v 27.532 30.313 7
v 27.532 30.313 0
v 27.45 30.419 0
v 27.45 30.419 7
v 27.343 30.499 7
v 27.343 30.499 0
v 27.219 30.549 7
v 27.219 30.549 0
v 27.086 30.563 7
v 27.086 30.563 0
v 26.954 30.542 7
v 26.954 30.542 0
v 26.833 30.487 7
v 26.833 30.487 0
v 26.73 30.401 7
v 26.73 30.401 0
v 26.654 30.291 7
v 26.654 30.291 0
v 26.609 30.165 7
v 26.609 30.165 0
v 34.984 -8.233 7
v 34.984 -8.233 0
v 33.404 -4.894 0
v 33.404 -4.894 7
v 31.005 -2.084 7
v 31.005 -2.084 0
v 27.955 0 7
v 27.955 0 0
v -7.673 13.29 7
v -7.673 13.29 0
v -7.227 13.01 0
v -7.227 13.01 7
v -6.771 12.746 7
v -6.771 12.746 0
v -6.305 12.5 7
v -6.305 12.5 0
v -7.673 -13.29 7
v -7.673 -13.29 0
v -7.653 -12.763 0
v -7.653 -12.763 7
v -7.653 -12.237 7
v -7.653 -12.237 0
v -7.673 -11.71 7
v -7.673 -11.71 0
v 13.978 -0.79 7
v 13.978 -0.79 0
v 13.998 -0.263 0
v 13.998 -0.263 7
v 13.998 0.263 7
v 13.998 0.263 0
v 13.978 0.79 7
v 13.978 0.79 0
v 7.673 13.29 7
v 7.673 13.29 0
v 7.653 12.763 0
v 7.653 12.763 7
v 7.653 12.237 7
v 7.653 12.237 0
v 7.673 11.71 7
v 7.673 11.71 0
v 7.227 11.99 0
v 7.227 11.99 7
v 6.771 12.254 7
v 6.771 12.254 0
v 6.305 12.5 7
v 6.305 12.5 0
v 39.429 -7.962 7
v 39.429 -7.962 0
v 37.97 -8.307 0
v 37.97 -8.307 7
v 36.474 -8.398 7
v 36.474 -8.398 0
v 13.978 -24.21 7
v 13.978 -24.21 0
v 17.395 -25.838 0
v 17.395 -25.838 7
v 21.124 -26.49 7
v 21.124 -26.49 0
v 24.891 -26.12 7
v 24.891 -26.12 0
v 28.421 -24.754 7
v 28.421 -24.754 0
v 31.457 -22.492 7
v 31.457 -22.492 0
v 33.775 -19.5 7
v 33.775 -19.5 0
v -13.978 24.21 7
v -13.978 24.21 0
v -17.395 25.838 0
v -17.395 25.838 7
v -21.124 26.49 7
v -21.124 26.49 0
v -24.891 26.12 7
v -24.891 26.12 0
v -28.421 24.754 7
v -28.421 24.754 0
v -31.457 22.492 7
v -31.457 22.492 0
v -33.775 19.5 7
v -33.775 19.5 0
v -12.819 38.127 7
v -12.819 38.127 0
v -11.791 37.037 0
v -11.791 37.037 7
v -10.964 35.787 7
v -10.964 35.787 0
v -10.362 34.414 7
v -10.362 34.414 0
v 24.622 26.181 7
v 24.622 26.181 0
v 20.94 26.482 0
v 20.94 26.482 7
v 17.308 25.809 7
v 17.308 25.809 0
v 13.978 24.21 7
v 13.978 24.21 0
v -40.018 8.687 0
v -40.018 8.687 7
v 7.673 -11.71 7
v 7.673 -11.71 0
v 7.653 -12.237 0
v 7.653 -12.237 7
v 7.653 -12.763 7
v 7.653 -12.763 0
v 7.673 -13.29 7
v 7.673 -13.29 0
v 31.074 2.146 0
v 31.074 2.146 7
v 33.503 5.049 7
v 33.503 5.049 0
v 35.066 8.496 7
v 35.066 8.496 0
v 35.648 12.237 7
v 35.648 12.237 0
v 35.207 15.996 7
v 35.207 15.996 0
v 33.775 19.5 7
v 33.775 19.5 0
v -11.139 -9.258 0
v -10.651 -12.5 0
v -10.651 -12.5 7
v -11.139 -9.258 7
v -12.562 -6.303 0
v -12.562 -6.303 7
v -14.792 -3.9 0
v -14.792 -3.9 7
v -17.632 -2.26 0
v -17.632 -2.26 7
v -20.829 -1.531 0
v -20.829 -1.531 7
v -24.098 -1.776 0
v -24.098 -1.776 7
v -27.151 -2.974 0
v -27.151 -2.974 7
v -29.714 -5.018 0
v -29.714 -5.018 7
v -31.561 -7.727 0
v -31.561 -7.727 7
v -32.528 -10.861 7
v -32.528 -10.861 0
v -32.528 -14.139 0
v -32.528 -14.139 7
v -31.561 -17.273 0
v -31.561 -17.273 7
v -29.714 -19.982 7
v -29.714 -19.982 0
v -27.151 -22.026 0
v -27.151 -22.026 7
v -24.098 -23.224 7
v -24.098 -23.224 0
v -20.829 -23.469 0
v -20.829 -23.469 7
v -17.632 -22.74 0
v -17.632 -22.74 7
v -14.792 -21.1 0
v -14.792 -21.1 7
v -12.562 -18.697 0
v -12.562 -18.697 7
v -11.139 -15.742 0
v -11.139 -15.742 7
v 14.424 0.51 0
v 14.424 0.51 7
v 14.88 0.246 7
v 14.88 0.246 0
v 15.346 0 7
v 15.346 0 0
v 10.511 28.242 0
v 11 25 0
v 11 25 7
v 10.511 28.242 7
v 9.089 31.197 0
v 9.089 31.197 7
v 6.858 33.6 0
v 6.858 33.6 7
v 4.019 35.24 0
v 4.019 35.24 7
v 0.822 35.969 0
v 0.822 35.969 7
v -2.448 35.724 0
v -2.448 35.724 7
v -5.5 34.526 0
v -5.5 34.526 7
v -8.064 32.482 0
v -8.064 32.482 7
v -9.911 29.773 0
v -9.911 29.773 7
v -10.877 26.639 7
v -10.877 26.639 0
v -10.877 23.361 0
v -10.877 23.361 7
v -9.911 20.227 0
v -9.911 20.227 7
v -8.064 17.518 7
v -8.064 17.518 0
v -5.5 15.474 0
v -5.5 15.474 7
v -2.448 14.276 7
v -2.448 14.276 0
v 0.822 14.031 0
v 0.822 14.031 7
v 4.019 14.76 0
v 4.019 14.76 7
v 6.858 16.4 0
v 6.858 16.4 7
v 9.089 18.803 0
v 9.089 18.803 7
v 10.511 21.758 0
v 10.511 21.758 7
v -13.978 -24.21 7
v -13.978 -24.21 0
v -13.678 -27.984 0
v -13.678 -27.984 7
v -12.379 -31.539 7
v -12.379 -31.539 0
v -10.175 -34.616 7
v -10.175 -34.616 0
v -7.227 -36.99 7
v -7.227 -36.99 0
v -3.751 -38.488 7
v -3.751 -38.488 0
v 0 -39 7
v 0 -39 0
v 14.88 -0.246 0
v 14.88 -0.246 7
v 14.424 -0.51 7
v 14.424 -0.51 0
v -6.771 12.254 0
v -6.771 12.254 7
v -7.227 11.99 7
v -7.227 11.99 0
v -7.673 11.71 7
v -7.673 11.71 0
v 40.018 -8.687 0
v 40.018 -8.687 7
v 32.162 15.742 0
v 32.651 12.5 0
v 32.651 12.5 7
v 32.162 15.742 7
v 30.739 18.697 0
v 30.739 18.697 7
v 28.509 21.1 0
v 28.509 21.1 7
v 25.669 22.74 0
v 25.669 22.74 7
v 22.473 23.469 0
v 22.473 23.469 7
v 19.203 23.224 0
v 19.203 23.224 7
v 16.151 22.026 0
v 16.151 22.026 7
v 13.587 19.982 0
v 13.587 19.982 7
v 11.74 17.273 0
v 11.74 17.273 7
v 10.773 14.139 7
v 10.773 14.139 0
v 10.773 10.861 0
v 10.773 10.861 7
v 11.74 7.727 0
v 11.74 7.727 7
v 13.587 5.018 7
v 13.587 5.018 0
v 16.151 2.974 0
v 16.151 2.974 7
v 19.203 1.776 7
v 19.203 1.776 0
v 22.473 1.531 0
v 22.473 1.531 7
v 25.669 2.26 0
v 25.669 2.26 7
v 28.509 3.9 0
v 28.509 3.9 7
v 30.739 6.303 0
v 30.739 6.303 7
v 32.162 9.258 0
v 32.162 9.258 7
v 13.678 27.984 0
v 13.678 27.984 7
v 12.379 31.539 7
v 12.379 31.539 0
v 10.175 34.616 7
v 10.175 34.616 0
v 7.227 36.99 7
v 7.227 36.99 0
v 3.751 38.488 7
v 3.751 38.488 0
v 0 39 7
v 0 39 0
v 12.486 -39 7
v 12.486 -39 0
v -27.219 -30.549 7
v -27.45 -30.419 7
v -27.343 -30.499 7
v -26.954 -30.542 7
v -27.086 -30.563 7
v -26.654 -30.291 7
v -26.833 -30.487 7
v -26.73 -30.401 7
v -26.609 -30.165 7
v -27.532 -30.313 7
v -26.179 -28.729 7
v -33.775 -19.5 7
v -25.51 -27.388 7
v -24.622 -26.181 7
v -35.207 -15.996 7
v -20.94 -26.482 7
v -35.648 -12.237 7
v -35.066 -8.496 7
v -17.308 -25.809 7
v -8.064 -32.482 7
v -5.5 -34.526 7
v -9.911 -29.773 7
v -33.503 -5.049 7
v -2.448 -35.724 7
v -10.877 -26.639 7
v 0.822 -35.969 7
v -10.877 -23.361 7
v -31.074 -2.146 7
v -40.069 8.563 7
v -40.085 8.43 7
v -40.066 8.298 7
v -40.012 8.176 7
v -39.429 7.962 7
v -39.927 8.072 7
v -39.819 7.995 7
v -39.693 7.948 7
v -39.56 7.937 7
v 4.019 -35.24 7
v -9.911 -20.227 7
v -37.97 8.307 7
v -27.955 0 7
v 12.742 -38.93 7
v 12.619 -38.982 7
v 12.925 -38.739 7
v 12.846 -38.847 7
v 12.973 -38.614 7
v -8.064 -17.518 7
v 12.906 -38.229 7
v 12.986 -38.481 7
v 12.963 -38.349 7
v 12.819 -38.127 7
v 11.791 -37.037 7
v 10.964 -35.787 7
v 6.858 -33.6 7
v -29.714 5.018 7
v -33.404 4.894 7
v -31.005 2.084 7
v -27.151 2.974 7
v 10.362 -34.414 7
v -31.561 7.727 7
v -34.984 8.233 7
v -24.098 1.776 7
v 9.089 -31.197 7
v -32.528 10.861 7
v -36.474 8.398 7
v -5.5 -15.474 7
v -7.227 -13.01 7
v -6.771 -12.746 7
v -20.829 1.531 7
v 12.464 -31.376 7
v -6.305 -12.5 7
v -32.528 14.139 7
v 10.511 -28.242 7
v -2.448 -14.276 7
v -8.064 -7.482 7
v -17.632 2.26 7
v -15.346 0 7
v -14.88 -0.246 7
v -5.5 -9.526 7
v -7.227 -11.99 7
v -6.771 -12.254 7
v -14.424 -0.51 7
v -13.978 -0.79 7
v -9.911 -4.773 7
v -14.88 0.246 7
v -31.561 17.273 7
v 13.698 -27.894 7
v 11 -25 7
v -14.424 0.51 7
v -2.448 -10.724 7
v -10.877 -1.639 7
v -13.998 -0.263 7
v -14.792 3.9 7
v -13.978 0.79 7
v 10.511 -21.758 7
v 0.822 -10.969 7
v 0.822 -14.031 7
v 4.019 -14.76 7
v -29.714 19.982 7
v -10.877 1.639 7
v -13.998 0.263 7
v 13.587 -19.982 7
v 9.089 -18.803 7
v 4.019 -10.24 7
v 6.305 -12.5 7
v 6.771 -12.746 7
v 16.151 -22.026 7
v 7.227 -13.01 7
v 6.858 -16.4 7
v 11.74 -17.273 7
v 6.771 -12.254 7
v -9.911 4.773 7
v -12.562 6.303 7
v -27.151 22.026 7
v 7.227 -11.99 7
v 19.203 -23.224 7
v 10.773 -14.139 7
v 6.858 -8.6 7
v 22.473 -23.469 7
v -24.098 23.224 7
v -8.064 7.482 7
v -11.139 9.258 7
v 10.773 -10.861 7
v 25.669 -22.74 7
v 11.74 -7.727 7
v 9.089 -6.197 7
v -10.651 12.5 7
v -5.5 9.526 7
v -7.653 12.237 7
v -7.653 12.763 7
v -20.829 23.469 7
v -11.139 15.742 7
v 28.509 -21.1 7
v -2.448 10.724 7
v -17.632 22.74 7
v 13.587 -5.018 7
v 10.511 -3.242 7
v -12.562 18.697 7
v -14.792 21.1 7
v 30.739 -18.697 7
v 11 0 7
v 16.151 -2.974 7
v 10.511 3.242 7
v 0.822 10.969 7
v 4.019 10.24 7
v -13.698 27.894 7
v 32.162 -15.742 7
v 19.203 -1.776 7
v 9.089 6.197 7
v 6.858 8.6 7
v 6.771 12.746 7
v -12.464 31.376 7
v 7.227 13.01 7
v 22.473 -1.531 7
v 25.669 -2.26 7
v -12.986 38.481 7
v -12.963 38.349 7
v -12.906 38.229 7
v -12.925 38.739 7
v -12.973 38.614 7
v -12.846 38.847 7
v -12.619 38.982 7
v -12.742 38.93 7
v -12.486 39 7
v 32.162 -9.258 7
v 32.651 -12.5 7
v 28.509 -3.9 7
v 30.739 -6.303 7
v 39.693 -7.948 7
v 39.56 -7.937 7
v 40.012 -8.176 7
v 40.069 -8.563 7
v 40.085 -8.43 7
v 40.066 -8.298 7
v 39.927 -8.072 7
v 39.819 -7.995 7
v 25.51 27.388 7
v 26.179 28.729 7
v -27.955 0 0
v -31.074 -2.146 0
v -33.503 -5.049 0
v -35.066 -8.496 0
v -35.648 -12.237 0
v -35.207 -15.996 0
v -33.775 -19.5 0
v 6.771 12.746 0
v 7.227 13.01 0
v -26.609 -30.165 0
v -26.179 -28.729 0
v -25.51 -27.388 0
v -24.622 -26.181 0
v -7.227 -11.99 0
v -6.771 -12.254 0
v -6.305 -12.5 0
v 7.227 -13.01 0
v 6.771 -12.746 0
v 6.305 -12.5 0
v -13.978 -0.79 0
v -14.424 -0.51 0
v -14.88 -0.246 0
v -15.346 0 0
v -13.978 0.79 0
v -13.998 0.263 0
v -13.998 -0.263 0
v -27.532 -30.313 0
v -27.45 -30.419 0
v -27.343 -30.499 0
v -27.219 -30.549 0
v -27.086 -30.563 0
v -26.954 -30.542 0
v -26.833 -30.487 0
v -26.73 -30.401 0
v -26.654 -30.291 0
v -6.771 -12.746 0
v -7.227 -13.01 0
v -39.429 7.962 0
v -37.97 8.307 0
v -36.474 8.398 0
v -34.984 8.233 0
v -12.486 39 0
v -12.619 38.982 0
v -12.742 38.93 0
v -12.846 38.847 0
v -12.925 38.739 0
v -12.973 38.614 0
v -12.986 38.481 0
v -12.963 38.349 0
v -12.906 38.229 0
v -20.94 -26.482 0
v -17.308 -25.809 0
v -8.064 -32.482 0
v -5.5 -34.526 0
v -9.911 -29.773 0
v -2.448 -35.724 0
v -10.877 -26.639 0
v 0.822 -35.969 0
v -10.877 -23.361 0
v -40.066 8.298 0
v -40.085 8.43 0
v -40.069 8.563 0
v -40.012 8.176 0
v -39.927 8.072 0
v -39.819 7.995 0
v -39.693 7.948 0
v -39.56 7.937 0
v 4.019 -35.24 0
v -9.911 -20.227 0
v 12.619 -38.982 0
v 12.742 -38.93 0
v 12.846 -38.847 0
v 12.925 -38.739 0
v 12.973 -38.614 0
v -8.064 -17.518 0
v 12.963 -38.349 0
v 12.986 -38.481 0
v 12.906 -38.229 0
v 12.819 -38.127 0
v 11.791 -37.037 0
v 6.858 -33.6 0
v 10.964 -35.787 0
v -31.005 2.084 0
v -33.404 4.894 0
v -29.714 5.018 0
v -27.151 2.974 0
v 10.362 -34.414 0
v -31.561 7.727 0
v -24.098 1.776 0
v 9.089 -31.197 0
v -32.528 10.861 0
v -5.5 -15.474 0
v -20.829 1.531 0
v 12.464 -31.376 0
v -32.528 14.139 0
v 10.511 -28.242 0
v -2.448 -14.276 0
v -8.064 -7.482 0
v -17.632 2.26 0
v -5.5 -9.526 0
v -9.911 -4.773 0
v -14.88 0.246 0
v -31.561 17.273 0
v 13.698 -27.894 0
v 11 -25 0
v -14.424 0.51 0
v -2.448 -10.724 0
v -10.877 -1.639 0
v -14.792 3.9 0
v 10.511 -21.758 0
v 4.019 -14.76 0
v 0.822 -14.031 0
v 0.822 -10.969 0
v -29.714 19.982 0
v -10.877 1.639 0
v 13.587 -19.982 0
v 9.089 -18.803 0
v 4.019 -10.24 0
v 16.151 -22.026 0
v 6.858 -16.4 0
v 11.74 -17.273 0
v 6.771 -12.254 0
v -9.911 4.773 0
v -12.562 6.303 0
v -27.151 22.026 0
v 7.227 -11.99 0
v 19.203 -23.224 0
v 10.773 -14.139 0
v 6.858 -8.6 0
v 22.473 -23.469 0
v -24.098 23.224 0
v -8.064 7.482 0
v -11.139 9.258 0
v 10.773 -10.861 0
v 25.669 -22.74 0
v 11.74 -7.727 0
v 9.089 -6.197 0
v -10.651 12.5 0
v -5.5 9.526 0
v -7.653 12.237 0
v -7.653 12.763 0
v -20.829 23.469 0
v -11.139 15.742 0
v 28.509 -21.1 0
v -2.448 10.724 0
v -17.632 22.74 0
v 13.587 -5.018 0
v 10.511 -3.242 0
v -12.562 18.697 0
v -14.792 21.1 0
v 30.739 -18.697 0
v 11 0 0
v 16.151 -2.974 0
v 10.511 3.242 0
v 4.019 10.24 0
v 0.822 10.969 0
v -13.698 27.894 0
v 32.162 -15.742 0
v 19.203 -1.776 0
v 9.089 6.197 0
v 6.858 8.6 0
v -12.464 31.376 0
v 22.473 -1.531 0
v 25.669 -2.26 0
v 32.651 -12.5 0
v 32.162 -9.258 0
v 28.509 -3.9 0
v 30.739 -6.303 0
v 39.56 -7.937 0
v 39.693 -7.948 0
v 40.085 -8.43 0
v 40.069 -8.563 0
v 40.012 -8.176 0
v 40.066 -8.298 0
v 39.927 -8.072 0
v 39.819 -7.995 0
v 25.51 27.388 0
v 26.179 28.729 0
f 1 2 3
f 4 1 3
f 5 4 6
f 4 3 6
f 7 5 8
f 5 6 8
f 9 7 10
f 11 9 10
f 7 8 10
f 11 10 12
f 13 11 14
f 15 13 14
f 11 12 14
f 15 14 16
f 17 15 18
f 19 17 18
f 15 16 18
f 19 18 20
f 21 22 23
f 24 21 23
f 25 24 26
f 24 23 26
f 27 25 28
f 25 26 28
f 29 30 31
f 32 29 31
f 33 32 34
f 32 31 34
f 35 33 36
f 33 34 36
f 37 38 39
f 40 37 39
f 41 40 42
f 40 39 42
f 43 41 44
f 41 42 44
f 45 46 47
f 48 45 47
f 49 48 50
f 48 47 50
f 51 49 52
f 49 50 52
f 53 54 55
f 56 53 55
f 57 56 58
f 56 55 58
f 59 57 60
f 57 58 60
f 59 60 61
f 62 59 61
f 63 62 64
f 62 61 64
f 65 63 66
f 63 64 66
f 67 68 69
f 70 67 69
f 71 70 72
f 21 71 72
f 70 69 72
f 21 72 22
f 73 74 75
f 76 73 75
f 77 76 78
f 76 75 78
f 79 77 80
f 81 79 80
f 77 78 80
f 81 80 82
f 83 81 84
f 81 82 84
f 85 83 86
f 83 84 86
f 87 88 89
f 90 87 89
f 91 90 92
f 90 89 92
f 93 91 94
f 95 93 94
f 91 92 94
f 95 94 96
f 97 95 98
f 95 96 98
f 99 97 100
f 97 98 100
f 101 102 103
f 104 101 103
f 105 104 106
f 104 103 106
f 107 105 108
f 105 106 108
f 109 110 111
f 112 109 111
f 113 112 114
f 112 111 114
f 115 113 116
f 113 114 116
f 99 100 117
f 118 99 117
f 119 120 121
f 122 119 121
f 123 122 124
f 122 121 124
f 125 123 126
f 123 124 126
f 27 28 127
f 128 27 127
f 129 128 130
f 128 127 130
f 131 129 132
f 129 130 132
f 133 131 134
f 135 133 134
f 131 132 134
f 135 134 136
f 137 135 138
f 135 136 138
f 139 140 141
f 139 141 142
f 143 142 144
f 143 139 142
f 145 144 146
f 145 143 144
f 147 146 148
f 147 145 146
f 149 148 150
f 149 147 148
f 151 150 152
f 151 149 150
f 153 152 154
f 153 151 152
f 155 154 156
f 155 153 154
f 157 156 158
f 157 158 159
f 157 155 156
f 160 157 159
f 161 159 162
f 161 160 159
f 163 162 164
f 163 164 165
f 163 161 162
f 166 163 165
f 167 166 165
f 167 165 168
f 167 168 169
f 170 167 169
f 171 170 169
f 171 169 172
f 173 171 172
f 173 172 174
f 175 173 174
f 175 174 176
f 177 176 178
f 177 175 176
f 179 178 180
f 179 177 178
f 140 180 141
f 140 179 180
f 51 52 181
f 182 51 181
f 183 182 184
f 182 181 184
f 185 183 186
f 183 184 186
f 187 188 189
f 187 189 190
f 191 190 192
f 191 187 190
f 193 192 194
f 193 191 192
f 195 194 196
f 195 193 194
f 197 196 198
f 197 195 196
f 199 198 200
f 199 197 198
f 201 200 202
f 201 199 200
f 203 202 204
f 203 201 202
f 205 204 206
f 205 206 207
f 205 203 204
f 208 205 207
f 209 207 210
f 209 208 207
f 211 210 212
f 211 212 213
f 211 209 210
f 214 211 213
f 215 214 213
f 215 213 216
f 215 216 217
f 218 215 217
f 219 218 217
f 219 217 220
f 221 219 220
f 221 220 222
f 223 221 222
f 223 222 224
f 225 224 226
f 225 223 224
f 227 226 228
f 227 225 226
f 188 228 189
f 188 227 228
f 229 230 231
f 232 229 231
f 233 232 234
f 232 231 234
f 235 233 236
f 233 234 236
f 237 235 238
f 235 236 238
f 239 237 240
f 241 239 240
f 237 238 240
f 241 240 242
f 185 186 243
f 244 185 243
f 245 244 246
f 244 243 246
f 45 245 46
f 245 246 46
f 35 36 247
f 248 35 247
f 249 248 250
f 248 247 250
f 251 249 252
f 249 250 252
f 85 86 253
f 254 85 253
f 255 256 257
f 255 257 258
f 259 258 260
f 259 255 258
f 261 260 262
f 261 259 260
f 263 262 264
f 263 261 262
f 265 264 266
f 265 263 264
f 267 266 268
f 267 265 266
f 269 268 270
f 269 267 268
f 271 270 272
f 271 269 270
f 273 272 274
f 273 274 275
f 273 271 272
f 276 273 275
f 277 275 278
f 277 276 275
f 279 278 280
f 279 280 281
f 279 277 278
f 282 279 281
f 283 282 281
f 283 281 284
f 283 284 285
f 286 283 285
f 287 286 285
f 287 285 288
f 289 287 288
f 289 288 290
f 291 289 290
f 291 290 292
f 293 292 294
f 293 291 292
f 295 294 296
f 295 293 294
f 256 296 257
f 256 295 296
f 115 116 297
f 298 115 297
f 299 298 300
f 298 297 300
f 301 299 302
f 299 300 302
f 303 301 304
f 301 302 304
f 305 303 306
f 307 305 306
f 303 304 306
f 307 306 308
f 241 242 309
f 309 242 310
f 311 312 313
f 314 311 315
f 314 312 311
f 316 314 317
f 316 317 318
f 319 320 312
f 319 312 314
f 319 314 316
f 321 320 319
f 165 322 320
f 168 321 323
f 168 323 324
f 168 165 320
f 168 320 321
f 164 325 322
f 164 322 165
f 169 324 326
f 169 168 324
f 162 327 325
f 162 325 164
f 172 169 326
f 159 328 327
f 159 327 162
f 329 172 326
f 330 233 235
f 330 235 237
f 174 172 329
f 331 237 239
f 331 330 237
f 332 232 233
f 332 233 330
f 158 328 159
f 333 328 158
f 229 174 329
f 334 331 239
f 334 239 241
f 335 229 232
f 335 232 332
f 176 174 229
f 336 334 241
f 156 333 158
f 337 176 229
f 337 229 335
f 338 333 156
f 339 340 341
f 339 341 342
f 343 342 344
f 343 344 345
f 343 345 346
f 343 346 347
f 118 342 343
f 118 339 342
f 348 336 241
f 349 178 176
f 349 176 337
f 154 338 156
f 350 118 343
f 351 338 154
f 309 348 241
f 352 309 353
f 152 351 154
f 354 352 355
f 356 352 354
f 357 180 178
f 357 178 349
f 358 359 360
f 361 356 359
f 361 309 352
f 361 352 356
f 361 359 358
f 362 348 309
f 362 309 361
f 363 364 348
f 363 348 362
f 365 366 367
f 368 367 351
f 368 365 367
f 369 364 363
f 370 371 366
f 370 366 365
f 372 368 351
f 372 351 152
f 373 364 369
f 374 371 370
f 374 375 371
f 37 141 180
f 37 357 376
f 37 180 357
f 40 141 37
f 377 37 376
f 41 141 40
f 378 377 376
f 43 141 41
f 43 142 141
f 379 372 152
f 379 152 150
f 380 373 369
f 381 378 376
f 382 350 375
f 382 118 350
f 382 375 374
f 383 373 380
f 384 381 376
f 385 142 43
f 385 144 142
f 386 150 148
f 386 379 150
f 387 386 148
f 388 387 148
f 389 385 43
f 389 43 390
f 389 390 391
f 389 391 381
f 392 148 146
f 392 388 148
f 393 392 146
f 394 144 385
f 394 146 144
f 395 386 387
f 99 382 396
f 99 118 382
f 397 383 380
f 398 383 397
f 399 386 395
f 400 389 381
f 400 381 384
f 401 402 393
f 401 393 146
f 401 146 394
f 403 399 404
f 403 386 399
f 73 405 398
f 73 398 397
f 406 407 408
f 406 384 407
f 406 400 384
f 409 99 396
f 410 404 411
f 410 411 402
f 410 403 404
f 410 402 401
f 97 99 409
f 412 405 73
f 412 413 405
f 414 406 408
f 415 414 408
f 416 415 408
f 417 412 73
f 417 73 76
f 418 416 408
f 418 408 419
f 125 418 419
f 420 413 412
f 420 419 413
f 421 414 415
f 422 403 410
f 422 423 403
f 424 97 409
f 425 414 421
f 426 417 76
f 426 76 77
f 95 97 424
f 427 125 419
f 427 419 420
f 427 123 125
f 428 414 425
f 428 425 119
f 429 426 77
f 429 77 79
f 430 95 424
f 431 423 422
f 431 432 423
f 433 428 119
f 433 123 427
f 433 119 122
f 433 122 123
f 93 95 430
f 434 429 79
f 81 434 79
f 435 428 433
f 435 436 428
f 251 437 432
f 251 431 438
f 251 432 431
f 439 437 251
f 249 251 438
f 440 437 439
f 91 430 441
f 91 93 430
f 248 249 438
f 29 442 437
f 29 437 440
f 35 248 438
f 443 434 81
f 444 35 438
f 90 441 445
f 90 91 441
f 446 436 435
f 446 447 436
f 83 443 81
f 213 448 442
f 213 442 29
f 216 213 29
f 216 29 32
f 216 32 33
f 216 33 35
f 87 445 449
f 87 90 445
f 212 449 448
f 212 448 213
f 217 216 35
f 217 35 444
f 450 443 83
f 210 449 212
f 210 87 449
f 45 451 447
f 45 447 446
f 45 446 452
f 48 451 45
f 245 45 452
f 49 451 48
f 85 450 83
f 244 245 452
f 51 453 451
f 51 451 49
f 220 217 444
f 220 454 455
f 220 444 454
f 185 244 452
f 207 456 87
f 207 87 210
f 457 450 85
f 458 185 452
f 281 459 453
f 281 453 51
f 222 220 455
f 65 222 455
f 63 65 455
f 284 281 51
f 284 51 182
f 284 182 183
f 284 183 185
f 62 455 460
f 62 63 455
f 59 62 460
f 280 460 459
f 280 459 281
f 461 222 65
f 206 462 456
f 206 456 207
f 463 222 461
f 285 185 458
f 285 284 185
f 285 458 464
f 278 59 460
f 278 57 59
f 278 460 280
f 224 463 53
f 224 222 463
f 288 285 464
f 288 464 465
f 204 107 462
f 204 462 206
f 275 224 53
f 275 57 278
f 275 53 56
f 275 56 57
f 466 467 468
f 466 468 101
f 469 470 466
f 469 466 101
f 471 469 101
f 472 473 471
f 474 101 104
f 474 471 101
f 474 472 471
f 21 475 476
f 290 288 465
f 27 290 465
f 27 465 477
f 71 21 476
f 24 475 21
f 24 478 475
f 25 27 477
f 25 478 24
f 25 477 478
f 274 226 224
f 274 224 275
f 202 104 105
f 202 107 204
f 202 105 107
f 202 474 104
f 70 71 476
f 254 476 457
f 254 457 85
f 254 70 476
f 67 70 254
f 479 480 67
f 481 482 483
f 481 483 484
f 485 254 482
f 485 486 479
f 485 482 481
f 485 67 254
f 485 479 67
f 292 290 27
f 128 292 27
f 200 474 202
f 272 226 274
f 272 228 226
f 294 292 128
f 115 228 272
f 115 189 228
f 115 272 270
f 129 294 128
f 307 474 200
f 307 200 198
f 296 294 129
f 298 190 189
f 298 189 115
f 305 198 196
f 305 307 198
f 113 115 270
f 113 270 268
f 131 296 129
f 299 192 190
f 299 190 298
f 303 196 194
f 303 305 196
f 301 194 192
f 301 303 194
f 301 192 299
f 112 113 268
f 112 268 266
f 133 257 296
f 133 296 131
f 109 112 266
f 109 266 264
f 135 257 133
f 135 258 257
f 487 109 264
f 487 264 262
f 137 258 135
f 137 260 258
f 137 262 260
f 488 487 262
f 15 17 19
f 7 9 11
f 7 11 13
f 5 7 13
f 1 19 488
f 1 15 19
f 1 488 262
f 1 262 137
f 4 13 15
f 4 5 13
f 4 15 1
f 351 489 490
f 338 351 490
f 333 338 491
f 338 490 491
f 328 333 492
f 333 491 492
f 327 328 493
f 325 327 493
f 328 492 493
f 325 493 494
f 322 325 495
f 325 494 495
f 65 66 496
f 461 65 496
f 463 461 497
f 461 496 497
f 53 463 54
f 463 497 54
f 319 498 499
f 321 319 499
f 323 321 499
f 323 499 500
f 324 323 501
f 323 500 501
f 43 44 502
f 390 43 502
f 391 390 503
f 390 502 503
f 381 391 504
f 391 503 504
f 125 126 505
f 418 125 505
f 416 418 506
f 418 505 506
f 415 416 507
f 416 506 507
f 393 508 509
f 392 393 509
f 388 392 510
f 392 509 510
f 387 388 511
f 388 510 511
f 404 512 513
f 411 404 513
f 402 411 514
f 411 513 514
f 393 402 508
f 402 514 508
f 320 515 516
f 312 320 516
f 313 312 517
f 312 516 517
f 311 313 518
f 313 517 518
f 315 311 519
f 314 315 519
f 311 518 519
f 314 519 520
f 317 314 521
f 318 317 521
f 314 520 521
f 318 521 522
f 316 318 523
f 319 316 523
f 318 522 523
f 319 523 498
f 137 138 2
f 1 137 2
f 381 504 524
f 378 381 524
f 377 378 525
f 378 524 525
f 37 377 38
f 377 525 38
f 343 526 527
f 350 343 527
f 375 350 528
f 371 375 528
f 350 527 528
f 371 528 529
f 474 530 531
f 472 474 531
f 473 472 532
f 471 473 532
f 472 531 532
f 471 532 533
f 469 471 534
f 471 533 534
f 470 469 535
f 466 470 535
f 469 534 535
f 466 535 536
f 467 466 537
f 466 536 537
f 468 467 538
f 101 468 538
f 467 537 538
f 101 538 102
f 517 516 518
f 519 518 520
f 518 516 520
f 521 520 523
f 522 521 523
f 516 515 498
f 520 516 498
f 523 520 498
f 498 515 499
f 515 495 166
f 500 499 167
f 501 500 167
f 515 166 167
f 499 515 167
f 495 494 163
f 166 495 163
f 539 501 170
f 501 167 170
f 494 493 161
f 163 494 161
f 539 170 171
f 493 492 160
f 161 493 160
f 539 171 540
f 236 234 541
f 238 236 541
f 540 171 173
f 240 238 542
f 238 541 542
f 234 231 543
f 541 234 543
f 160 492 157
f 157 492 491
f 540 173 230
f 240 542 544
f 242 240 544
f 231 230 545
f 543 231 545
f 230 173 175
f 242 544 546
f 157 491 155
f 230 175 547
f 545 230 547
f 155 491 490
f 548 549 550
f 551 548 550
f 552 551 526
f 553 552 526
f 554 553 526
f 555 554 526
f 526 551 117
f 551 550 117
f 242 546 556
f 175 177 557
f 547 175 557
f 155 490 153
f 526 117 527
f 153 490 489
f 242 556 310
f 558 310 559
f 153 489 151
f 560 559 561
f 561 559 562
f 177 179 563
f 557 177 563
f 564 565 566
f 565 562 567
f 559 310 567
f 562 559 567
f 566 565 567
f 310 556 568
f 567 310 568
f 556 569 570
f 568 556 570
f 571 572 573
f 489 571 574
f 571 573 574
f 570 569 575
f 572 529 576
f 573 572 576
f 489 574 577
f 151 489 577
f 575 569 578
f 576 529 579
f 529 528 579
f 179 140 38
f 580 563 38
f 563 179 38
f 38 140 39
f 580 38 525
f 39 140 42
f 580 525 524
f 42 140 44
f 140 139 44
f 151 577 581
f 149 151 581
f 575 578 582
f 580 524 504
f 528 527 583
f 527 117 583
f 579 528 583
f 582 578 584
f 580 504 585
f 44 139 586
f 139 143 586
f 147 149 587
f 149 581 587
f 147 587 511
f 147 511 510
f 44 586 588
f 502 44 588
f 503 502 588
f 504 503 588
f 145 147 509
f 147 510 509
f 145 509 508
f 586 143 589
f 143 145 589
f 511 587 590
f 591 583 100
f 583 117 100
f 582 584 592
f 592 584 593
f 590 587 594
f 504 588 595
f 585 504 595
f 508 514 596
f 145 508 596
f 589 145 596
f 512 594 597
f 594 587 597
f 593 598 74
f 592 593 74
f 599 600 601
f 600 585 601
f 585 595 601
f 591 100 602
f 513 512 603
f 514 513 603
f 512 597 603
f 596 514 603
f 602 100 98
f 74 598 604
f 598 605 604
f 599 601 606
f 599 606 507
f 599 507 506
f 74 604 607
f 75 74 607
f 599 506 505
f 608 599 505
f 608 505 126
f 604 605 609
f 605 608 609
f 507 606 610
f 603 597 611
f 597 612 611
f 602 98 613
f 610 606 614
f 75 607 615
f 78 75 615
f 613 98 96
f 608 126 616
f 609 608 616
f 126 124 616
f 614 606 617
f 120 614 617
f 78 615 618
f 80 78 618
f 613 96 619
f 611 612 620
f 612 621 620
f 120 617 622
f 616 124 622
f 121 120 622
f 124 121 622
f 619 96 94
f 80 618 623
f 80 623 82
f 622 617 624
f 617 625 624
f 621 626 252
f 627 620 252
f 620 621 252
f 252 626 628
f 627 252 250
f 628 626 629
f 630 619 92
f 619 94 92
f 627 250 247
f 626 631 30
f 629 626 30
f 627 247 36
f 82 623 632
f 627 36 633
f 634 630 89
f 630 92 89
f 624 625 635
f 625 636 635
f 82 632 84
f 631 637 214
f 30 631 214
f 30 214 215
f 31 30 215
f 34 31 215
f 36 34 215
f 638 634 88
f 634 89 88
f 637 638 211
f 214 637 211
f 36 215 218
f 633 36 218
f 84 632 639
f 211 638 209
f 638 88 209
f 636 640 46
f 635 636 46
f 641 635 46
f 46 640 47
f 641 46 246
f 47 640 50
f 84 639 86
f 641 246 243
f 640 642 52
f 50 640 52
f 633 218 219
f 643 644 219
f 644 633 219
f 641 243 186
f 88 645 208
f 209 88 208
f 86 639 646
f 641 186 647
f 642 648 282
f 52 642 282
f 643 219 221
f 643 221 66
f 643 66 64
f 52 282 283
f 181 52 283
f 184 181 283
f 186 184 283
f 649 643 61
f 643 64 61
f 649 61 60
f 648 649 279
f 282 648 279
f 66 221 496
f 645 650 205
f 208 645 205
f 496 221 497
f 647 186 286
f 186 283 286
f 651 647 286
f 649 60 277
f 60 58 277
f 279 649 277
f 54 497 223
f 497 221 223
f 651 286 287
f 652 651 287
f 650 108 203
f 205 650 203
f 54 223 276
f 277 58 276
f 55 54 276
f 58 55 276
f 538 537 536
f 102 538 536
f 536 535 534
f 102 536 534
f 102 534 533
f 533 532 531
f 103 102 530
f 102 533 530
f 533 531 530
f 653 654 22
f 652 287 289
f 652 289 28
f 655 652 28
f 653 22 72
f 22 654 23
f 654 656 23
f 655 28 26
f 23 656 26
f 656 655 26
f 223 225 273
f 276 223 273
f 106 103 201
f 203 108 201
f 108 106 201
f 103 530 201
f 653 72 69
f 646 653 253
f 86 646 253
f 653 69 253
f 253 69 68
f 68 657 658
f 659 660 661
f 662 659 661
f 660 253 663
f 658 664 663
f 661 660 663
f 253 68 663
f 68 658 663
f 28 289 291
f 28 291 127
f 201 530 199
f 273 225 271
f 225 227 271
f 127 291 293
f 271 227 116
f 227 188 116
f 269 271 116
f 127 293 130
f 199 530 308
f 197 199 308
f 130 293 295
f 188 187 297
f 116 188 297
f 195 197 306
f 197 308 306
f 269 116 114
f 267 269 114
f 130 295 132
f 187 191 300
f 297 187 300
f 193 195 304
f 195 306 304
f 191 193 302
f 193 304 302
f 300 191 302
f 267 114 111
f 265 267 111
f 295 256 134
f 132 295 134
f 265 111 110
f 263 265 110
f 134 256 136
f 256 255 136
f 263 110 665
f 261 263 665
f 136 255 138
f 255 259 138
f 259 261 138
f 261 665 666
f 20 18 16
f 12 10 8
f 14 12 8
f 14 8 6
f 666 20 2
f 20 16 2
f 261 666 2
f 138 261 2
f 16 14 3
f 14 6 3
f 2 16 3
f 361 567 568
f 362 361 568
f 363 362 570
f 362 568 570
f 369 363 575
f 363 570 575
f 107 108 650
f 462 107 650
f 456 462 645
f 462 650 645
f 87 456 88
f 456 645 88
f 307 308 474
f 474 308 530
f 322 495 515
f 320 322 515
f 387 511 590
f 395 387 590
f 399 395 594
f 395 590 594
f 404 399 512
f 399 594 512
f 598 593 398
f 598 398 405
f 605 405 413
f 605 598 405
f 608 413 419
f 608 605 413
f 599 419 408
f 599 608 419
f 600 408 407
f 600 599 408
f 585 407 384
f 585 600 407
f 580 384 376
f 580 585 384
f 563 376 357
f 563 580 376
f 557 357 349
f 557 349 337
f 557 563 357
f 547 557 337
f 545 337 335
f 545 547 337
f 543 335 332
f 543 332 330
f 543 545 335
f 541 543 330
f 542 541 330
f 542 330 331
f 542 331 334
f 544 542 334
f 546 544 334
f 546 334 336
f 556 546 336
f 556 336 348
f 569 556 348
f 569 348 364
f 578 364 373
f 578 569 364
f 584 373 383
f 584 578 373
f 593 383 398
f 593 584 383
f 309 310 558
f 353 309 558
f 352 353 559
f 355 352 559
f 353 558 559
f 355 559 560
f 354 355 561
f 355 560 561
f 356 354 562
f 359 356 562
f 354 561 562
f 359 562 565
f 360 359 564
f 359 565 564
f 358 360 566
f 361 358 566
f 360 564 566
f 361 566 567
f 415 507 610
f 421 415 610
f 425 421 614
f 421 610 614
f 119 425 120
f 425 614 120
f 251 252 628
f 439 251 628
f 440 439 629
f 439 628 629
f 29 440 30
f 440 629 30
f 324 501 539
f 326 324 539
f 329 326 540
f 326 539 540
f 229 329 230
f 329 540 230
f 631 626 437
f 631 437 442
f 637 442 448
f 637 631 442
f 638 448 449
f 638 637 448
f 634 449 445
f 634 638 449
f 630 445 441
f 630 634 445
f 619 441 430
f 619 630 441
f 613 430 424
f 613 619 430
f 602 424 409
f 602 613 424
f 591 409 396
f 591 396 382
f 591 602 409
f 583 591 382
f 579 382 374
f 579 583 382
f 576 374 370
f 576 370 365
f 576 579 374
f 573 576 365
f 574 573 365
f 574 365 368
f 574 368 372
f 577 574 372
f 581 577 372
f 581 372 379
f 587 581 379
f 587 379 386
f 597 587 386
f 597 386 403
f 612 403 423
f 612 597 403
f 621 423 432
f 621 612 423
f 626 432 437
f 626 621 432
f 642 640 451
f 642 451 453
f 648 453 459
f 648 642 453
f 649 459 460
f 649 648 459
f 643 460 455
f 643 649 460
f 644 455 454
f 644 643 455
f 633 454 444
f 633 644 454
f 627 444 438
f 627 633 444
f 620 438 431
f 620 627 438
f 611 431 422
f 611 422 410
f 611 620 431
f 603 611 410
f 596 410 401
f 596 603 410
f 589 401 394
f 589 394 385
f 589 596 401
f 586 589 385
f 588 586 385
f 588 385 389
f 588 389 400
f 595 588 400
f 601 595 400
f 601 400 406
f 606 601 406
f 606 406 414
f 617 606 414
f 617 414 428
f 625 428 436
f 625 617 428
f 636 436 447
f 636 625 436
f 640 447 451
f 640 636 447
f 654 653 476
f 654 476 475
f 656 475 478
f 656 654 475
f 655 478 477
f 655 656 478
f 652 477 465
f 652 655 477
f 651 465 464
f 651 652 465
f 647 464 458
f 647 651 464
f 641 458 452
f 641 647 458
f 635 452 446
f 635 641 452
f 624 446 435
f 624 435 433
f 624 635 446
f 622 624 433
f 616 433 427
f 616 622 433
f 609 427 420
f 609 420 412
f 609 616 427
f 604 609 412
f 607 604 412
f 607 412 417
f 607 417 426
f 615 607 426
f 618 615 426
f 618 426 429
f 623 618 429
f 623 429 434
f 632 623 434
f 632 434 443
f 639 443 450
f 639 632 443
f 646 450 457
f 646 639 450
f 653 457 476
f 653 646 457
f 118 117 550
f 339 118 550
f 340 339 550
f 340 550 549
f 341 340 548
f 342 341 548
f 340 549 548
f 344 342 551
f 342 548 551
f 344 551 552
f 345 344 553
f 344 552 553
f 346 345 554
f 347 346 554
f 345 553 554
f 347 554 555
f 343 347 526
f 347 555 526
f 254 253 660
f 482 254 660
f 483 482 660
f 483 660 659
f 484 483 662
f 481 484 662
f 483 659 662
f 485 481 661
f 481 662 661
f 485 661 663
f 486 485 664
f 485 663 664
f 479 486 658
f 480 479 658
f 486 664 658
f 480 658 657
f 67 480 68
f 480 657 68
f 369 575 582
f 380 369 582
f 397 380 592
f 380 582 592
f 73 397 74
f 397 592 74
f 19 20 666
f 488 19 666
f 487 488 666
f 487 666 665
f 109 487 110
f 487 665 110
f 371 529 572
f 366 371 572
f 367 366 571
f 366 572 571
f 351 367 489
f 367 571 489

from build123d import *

# Parameters (mm, degrees)
F0_R     = 11
F1_DEPTH = 7


with BuildPart() as f1:
    # F0 (on Top) → F1 (new body)
    with BuildSketch(Plane.XY):
        with BuildLine():
            ThreePointArc((-10.362367, 34.413892), (-13.196178, 29.675563), (-13.977698, 24.210082))
            ThreePointArc((-13.977698, 24.210082), (-24.891005, 26.119838), (-33.774991, 19.5))
            ThreePointArc((-33.774991, 19.5), (-35.570661, 13.994279), (-34.984488, 8.232873))
            ThreePointArc((-34.984488, 8.232873), (-32.29788, 3.409556), (-27.955395, 0))
            ThreePointArc((-27.955395, 0), (-35.065946, -8.496324), (-33.774991, -19.5))
            ThreePointArc((-33.774991, -19.5), (-29.904732, -23.807957), (-24.622121, -26.181019))
            ThreePointArc((-24.622121, -26.181019), (-19.101702, -26.266007), (-13.977698, -24.210082))
            ThreePointArc((-13.977698, -24.210082), (-10.174941, -34.616162), (0, -39))
            ThreePointArc((0, -39), (5.665929, -37.802236), (10.362367, -34.413892))
            ThreePointArc((10.362367, -34.413892), (13.196178, -29.675563), (13.977698, -24.210082))
            ThreePointArc((13.977698, -24.210082), (24.891005, -26.119838), (33.774991, -19.5))
            ThreePointArc((33.774991, -19.5), (35.570661, -13.994279), (34.984488, -8.232873))
            ThreePointArc((34.984488, -8.232873), (32.29788, -3.409556), (27.955395, 0))
            ThreePointArc((27.955395, 0), (35.065946, 8.496324), (33.774991, 19.5))
            ThreePointArc((33.774991, 19.5), (29.904732, 23.807957), (24.622121, 26.181019))
            ThreePointArc((24.622121, 26.181019), (19.101702, 26.266007), (13.977698, 24.210082))
            ThreePointArc((13.977698, 24.210082), (10.174941, 34.616162), (0, 39))
            ThreePointArc((0, 39), (-5.665929, 37.802236), (-10.362367, 34.413892))
        make_face()
        with Locations((-21.650635, -12.5)):
            Circle(F0_R, mode=Mode.SUBTRACT)
        with BuildLine():
            ThreePointArc((-6.30476, -12.5), (-7, -12.875644), (-7.672937, -13.289918))
            ThreePointArc((-7.672937, -13.289918), (-7.650635, -12.5), (-7.672937, -11.710082))
            ThreePointArc((-7.672937, -11.710082), (-7, -12.124356), (-6.30476, -12.5))
        make_face(mode=Mode.SUBTRACT)
        with Locations((0, -25)):
            Circle(F0_R, mode=Mode.SUBTRACT)
        with BuildLine():
            ThreePointArc((7.672937, -11.710082), (7.650635, -12.5), (7.672937, -13.289918))
            ThreePointArc((7.672937, -13.289918), (7, -12.875644), (6.30476, -12.5))
            ThreePointArc((6.30476, -12.5), (7, -12.124356), (7.672937, -11.710082))
        make_face(mode=Mode.SUBTRACT)
        with Locations((21.650635, -12.5)):
            Circle(F0_R, mode=Mode.SUBTRACT)
        with Locations((-21.650635, 12.5)):
            Circle(F0_R, mode=Mode.SUBTRACT)
        with BuildLine():
            ThreePointArc((-15.345875, 0), (-14.650635, 0.375644), (-13.977698, 0.789918))
            ThreePointArc((-13.977698, 0.789918), (-14, 0), (-13.977698, -0.789918))
            ThreePointArc((-13.977698, -0.789918), (-14.650635, -0.375644), (-15.345875, 0))
        make_face(mode=Mode.SUBTRACT)
        with BuildLine():
            ThreePointArc((-7.672937, 11.710082), (-7.650635, 12.5), (-7.672937, 13.289918))
            ThreePointArc((-7.672937, 13.289918), (-7, 12.875644), (-6.30476, 12.5))
            ThreePointArc((-6.30476, 12.5), (-7, 12.124356), (-7.672937, 11.710082))
        make_face(mode=Mode.SUBTRACT)
        Circle(F0_R, mode=Mode.SUBTRACT)
        with BuildLine():
            ThreePointArc((13.977698, -0.789918), (14, 0), (13.977698, 0.789918))
            ThreePointArc((13.977698, 0.789918), (14.650635, 0.375644), (15.345875, 0))
            ThreePointArc((15.345875, 0), (14.650635, -0.375644), (13.977698, -0.789918))
        make_face(mode=Mode.SUBTRACT)
        with BuildLine():
            ThreePointArc((6.30476, 12.5), (7, 12.875644), (7.672937, 13.289918))
            ThreePointArc((7.672937, 13.289918), (7.650635, 12.5), (7.672937, 11.710082))
            ThreePointArc((7.672937, 11.710082), (7, 12.124356), (6.30476, 12.5))
        make_face(mode=Mode.SUBTRACT)
        with Locations((21.650635, 12.5)):
            Circle(F0_R, mode=Mode.SUBTRACT)
        with Locations((0, 25)):
            Circle(F0_R, mode=Mode.SUBTRACT)
        with BuildLine():
            ThreePointArc((-34.984488, 8.232873), (-35.570661, 13.994279), (-33.774991, 19.5))
            Line((-33.774991, 19.5), (-40.018085, 8.686644))
            ThreePointArc((-40.018085, 8.686644), (-39.972979, 8.121164), (-39.428556, 7.961773))
            ThreePointArc((-39.428556, 7.961773), (-37.224068, 8.384953), (-34.984488, 8.232873))
        make_face()
        with BuildLine():
            ThreePointArc((-12.81918, 38.127017), (-11.350452, 36.429465), (-10.362367, 34.413892))
            ThreePointArc((-10.362367, 34.413892), (-5.665929, 37.802236), (0, 39))
            Line((0, 39), (-12.486188, 39))
            ThreePointArc((-12.486188, 39), (-12.953356, 38.678197), (-12.81918, 38.127017))
        make_face()
        with BuildLine():
            ThreePointArc((-24.622121, -26.181019), (-29.904732, -23.807957), (-33.774991, -19.5))
            Line((-33.774991, -19.5), (-27.531897, -30.313356))
            ThreePointArc((-27.531897, -30.313356), (-27.019624, -30.557034), (-26.609375, -30.165244))
            ThreePointArc((-26.609375, -30.165244), (-25.873616, -28.044512), (-24.622121, -26.181019))
        make_face()
        with BuildLine():
            ThreePointArc((26.609375, 30.165244), (25.873616, 28.044512), (24.622121, 26.181019))
            ThreePointArc((24.622121, 26.181019), (29.904732, 23.807957), (33.774991, 19.5))
            Line((33.774991, 19.5), (27.531897, 30.313356))
            ThreePointArc((27.531897, 30.313356), (27.019624, 30.557034), (26.609375, 30.165244))
        make_face()
        with BuildLine():
            ThreePointArc((10.362367, -34.413892), (5.665929, -37.802236), (0, -39))
            Line((0, -39), (12.486188, -39))
            ThreePointArc((12.486188, -39), (12.953356, -38.678197), (12.81918, -38.127017))
            ThreePointArc((12.81918, -38.127017), (11.350452, -36.429465), (10.362367, -34.413892))
        make_face()
        with BuildLine():
            ThreePointArc((39.428556, -7.961773), (37.224068, -8.384953), (34.984488, -8.232873))
            ThreePointArc((34.984488, -8.232873), (35.570661, -13.994279), (33.774991, -19.5))
            Line((33.774991, -19.5), (40.018085, -8.686644))
            ThreePointArc((40.018085, -8.686644), (39.972979, -8.121164), (39.428556, -7.961773))
        make_face()
    extrude(amount=F1_DEPTH)


solid = f1.part
